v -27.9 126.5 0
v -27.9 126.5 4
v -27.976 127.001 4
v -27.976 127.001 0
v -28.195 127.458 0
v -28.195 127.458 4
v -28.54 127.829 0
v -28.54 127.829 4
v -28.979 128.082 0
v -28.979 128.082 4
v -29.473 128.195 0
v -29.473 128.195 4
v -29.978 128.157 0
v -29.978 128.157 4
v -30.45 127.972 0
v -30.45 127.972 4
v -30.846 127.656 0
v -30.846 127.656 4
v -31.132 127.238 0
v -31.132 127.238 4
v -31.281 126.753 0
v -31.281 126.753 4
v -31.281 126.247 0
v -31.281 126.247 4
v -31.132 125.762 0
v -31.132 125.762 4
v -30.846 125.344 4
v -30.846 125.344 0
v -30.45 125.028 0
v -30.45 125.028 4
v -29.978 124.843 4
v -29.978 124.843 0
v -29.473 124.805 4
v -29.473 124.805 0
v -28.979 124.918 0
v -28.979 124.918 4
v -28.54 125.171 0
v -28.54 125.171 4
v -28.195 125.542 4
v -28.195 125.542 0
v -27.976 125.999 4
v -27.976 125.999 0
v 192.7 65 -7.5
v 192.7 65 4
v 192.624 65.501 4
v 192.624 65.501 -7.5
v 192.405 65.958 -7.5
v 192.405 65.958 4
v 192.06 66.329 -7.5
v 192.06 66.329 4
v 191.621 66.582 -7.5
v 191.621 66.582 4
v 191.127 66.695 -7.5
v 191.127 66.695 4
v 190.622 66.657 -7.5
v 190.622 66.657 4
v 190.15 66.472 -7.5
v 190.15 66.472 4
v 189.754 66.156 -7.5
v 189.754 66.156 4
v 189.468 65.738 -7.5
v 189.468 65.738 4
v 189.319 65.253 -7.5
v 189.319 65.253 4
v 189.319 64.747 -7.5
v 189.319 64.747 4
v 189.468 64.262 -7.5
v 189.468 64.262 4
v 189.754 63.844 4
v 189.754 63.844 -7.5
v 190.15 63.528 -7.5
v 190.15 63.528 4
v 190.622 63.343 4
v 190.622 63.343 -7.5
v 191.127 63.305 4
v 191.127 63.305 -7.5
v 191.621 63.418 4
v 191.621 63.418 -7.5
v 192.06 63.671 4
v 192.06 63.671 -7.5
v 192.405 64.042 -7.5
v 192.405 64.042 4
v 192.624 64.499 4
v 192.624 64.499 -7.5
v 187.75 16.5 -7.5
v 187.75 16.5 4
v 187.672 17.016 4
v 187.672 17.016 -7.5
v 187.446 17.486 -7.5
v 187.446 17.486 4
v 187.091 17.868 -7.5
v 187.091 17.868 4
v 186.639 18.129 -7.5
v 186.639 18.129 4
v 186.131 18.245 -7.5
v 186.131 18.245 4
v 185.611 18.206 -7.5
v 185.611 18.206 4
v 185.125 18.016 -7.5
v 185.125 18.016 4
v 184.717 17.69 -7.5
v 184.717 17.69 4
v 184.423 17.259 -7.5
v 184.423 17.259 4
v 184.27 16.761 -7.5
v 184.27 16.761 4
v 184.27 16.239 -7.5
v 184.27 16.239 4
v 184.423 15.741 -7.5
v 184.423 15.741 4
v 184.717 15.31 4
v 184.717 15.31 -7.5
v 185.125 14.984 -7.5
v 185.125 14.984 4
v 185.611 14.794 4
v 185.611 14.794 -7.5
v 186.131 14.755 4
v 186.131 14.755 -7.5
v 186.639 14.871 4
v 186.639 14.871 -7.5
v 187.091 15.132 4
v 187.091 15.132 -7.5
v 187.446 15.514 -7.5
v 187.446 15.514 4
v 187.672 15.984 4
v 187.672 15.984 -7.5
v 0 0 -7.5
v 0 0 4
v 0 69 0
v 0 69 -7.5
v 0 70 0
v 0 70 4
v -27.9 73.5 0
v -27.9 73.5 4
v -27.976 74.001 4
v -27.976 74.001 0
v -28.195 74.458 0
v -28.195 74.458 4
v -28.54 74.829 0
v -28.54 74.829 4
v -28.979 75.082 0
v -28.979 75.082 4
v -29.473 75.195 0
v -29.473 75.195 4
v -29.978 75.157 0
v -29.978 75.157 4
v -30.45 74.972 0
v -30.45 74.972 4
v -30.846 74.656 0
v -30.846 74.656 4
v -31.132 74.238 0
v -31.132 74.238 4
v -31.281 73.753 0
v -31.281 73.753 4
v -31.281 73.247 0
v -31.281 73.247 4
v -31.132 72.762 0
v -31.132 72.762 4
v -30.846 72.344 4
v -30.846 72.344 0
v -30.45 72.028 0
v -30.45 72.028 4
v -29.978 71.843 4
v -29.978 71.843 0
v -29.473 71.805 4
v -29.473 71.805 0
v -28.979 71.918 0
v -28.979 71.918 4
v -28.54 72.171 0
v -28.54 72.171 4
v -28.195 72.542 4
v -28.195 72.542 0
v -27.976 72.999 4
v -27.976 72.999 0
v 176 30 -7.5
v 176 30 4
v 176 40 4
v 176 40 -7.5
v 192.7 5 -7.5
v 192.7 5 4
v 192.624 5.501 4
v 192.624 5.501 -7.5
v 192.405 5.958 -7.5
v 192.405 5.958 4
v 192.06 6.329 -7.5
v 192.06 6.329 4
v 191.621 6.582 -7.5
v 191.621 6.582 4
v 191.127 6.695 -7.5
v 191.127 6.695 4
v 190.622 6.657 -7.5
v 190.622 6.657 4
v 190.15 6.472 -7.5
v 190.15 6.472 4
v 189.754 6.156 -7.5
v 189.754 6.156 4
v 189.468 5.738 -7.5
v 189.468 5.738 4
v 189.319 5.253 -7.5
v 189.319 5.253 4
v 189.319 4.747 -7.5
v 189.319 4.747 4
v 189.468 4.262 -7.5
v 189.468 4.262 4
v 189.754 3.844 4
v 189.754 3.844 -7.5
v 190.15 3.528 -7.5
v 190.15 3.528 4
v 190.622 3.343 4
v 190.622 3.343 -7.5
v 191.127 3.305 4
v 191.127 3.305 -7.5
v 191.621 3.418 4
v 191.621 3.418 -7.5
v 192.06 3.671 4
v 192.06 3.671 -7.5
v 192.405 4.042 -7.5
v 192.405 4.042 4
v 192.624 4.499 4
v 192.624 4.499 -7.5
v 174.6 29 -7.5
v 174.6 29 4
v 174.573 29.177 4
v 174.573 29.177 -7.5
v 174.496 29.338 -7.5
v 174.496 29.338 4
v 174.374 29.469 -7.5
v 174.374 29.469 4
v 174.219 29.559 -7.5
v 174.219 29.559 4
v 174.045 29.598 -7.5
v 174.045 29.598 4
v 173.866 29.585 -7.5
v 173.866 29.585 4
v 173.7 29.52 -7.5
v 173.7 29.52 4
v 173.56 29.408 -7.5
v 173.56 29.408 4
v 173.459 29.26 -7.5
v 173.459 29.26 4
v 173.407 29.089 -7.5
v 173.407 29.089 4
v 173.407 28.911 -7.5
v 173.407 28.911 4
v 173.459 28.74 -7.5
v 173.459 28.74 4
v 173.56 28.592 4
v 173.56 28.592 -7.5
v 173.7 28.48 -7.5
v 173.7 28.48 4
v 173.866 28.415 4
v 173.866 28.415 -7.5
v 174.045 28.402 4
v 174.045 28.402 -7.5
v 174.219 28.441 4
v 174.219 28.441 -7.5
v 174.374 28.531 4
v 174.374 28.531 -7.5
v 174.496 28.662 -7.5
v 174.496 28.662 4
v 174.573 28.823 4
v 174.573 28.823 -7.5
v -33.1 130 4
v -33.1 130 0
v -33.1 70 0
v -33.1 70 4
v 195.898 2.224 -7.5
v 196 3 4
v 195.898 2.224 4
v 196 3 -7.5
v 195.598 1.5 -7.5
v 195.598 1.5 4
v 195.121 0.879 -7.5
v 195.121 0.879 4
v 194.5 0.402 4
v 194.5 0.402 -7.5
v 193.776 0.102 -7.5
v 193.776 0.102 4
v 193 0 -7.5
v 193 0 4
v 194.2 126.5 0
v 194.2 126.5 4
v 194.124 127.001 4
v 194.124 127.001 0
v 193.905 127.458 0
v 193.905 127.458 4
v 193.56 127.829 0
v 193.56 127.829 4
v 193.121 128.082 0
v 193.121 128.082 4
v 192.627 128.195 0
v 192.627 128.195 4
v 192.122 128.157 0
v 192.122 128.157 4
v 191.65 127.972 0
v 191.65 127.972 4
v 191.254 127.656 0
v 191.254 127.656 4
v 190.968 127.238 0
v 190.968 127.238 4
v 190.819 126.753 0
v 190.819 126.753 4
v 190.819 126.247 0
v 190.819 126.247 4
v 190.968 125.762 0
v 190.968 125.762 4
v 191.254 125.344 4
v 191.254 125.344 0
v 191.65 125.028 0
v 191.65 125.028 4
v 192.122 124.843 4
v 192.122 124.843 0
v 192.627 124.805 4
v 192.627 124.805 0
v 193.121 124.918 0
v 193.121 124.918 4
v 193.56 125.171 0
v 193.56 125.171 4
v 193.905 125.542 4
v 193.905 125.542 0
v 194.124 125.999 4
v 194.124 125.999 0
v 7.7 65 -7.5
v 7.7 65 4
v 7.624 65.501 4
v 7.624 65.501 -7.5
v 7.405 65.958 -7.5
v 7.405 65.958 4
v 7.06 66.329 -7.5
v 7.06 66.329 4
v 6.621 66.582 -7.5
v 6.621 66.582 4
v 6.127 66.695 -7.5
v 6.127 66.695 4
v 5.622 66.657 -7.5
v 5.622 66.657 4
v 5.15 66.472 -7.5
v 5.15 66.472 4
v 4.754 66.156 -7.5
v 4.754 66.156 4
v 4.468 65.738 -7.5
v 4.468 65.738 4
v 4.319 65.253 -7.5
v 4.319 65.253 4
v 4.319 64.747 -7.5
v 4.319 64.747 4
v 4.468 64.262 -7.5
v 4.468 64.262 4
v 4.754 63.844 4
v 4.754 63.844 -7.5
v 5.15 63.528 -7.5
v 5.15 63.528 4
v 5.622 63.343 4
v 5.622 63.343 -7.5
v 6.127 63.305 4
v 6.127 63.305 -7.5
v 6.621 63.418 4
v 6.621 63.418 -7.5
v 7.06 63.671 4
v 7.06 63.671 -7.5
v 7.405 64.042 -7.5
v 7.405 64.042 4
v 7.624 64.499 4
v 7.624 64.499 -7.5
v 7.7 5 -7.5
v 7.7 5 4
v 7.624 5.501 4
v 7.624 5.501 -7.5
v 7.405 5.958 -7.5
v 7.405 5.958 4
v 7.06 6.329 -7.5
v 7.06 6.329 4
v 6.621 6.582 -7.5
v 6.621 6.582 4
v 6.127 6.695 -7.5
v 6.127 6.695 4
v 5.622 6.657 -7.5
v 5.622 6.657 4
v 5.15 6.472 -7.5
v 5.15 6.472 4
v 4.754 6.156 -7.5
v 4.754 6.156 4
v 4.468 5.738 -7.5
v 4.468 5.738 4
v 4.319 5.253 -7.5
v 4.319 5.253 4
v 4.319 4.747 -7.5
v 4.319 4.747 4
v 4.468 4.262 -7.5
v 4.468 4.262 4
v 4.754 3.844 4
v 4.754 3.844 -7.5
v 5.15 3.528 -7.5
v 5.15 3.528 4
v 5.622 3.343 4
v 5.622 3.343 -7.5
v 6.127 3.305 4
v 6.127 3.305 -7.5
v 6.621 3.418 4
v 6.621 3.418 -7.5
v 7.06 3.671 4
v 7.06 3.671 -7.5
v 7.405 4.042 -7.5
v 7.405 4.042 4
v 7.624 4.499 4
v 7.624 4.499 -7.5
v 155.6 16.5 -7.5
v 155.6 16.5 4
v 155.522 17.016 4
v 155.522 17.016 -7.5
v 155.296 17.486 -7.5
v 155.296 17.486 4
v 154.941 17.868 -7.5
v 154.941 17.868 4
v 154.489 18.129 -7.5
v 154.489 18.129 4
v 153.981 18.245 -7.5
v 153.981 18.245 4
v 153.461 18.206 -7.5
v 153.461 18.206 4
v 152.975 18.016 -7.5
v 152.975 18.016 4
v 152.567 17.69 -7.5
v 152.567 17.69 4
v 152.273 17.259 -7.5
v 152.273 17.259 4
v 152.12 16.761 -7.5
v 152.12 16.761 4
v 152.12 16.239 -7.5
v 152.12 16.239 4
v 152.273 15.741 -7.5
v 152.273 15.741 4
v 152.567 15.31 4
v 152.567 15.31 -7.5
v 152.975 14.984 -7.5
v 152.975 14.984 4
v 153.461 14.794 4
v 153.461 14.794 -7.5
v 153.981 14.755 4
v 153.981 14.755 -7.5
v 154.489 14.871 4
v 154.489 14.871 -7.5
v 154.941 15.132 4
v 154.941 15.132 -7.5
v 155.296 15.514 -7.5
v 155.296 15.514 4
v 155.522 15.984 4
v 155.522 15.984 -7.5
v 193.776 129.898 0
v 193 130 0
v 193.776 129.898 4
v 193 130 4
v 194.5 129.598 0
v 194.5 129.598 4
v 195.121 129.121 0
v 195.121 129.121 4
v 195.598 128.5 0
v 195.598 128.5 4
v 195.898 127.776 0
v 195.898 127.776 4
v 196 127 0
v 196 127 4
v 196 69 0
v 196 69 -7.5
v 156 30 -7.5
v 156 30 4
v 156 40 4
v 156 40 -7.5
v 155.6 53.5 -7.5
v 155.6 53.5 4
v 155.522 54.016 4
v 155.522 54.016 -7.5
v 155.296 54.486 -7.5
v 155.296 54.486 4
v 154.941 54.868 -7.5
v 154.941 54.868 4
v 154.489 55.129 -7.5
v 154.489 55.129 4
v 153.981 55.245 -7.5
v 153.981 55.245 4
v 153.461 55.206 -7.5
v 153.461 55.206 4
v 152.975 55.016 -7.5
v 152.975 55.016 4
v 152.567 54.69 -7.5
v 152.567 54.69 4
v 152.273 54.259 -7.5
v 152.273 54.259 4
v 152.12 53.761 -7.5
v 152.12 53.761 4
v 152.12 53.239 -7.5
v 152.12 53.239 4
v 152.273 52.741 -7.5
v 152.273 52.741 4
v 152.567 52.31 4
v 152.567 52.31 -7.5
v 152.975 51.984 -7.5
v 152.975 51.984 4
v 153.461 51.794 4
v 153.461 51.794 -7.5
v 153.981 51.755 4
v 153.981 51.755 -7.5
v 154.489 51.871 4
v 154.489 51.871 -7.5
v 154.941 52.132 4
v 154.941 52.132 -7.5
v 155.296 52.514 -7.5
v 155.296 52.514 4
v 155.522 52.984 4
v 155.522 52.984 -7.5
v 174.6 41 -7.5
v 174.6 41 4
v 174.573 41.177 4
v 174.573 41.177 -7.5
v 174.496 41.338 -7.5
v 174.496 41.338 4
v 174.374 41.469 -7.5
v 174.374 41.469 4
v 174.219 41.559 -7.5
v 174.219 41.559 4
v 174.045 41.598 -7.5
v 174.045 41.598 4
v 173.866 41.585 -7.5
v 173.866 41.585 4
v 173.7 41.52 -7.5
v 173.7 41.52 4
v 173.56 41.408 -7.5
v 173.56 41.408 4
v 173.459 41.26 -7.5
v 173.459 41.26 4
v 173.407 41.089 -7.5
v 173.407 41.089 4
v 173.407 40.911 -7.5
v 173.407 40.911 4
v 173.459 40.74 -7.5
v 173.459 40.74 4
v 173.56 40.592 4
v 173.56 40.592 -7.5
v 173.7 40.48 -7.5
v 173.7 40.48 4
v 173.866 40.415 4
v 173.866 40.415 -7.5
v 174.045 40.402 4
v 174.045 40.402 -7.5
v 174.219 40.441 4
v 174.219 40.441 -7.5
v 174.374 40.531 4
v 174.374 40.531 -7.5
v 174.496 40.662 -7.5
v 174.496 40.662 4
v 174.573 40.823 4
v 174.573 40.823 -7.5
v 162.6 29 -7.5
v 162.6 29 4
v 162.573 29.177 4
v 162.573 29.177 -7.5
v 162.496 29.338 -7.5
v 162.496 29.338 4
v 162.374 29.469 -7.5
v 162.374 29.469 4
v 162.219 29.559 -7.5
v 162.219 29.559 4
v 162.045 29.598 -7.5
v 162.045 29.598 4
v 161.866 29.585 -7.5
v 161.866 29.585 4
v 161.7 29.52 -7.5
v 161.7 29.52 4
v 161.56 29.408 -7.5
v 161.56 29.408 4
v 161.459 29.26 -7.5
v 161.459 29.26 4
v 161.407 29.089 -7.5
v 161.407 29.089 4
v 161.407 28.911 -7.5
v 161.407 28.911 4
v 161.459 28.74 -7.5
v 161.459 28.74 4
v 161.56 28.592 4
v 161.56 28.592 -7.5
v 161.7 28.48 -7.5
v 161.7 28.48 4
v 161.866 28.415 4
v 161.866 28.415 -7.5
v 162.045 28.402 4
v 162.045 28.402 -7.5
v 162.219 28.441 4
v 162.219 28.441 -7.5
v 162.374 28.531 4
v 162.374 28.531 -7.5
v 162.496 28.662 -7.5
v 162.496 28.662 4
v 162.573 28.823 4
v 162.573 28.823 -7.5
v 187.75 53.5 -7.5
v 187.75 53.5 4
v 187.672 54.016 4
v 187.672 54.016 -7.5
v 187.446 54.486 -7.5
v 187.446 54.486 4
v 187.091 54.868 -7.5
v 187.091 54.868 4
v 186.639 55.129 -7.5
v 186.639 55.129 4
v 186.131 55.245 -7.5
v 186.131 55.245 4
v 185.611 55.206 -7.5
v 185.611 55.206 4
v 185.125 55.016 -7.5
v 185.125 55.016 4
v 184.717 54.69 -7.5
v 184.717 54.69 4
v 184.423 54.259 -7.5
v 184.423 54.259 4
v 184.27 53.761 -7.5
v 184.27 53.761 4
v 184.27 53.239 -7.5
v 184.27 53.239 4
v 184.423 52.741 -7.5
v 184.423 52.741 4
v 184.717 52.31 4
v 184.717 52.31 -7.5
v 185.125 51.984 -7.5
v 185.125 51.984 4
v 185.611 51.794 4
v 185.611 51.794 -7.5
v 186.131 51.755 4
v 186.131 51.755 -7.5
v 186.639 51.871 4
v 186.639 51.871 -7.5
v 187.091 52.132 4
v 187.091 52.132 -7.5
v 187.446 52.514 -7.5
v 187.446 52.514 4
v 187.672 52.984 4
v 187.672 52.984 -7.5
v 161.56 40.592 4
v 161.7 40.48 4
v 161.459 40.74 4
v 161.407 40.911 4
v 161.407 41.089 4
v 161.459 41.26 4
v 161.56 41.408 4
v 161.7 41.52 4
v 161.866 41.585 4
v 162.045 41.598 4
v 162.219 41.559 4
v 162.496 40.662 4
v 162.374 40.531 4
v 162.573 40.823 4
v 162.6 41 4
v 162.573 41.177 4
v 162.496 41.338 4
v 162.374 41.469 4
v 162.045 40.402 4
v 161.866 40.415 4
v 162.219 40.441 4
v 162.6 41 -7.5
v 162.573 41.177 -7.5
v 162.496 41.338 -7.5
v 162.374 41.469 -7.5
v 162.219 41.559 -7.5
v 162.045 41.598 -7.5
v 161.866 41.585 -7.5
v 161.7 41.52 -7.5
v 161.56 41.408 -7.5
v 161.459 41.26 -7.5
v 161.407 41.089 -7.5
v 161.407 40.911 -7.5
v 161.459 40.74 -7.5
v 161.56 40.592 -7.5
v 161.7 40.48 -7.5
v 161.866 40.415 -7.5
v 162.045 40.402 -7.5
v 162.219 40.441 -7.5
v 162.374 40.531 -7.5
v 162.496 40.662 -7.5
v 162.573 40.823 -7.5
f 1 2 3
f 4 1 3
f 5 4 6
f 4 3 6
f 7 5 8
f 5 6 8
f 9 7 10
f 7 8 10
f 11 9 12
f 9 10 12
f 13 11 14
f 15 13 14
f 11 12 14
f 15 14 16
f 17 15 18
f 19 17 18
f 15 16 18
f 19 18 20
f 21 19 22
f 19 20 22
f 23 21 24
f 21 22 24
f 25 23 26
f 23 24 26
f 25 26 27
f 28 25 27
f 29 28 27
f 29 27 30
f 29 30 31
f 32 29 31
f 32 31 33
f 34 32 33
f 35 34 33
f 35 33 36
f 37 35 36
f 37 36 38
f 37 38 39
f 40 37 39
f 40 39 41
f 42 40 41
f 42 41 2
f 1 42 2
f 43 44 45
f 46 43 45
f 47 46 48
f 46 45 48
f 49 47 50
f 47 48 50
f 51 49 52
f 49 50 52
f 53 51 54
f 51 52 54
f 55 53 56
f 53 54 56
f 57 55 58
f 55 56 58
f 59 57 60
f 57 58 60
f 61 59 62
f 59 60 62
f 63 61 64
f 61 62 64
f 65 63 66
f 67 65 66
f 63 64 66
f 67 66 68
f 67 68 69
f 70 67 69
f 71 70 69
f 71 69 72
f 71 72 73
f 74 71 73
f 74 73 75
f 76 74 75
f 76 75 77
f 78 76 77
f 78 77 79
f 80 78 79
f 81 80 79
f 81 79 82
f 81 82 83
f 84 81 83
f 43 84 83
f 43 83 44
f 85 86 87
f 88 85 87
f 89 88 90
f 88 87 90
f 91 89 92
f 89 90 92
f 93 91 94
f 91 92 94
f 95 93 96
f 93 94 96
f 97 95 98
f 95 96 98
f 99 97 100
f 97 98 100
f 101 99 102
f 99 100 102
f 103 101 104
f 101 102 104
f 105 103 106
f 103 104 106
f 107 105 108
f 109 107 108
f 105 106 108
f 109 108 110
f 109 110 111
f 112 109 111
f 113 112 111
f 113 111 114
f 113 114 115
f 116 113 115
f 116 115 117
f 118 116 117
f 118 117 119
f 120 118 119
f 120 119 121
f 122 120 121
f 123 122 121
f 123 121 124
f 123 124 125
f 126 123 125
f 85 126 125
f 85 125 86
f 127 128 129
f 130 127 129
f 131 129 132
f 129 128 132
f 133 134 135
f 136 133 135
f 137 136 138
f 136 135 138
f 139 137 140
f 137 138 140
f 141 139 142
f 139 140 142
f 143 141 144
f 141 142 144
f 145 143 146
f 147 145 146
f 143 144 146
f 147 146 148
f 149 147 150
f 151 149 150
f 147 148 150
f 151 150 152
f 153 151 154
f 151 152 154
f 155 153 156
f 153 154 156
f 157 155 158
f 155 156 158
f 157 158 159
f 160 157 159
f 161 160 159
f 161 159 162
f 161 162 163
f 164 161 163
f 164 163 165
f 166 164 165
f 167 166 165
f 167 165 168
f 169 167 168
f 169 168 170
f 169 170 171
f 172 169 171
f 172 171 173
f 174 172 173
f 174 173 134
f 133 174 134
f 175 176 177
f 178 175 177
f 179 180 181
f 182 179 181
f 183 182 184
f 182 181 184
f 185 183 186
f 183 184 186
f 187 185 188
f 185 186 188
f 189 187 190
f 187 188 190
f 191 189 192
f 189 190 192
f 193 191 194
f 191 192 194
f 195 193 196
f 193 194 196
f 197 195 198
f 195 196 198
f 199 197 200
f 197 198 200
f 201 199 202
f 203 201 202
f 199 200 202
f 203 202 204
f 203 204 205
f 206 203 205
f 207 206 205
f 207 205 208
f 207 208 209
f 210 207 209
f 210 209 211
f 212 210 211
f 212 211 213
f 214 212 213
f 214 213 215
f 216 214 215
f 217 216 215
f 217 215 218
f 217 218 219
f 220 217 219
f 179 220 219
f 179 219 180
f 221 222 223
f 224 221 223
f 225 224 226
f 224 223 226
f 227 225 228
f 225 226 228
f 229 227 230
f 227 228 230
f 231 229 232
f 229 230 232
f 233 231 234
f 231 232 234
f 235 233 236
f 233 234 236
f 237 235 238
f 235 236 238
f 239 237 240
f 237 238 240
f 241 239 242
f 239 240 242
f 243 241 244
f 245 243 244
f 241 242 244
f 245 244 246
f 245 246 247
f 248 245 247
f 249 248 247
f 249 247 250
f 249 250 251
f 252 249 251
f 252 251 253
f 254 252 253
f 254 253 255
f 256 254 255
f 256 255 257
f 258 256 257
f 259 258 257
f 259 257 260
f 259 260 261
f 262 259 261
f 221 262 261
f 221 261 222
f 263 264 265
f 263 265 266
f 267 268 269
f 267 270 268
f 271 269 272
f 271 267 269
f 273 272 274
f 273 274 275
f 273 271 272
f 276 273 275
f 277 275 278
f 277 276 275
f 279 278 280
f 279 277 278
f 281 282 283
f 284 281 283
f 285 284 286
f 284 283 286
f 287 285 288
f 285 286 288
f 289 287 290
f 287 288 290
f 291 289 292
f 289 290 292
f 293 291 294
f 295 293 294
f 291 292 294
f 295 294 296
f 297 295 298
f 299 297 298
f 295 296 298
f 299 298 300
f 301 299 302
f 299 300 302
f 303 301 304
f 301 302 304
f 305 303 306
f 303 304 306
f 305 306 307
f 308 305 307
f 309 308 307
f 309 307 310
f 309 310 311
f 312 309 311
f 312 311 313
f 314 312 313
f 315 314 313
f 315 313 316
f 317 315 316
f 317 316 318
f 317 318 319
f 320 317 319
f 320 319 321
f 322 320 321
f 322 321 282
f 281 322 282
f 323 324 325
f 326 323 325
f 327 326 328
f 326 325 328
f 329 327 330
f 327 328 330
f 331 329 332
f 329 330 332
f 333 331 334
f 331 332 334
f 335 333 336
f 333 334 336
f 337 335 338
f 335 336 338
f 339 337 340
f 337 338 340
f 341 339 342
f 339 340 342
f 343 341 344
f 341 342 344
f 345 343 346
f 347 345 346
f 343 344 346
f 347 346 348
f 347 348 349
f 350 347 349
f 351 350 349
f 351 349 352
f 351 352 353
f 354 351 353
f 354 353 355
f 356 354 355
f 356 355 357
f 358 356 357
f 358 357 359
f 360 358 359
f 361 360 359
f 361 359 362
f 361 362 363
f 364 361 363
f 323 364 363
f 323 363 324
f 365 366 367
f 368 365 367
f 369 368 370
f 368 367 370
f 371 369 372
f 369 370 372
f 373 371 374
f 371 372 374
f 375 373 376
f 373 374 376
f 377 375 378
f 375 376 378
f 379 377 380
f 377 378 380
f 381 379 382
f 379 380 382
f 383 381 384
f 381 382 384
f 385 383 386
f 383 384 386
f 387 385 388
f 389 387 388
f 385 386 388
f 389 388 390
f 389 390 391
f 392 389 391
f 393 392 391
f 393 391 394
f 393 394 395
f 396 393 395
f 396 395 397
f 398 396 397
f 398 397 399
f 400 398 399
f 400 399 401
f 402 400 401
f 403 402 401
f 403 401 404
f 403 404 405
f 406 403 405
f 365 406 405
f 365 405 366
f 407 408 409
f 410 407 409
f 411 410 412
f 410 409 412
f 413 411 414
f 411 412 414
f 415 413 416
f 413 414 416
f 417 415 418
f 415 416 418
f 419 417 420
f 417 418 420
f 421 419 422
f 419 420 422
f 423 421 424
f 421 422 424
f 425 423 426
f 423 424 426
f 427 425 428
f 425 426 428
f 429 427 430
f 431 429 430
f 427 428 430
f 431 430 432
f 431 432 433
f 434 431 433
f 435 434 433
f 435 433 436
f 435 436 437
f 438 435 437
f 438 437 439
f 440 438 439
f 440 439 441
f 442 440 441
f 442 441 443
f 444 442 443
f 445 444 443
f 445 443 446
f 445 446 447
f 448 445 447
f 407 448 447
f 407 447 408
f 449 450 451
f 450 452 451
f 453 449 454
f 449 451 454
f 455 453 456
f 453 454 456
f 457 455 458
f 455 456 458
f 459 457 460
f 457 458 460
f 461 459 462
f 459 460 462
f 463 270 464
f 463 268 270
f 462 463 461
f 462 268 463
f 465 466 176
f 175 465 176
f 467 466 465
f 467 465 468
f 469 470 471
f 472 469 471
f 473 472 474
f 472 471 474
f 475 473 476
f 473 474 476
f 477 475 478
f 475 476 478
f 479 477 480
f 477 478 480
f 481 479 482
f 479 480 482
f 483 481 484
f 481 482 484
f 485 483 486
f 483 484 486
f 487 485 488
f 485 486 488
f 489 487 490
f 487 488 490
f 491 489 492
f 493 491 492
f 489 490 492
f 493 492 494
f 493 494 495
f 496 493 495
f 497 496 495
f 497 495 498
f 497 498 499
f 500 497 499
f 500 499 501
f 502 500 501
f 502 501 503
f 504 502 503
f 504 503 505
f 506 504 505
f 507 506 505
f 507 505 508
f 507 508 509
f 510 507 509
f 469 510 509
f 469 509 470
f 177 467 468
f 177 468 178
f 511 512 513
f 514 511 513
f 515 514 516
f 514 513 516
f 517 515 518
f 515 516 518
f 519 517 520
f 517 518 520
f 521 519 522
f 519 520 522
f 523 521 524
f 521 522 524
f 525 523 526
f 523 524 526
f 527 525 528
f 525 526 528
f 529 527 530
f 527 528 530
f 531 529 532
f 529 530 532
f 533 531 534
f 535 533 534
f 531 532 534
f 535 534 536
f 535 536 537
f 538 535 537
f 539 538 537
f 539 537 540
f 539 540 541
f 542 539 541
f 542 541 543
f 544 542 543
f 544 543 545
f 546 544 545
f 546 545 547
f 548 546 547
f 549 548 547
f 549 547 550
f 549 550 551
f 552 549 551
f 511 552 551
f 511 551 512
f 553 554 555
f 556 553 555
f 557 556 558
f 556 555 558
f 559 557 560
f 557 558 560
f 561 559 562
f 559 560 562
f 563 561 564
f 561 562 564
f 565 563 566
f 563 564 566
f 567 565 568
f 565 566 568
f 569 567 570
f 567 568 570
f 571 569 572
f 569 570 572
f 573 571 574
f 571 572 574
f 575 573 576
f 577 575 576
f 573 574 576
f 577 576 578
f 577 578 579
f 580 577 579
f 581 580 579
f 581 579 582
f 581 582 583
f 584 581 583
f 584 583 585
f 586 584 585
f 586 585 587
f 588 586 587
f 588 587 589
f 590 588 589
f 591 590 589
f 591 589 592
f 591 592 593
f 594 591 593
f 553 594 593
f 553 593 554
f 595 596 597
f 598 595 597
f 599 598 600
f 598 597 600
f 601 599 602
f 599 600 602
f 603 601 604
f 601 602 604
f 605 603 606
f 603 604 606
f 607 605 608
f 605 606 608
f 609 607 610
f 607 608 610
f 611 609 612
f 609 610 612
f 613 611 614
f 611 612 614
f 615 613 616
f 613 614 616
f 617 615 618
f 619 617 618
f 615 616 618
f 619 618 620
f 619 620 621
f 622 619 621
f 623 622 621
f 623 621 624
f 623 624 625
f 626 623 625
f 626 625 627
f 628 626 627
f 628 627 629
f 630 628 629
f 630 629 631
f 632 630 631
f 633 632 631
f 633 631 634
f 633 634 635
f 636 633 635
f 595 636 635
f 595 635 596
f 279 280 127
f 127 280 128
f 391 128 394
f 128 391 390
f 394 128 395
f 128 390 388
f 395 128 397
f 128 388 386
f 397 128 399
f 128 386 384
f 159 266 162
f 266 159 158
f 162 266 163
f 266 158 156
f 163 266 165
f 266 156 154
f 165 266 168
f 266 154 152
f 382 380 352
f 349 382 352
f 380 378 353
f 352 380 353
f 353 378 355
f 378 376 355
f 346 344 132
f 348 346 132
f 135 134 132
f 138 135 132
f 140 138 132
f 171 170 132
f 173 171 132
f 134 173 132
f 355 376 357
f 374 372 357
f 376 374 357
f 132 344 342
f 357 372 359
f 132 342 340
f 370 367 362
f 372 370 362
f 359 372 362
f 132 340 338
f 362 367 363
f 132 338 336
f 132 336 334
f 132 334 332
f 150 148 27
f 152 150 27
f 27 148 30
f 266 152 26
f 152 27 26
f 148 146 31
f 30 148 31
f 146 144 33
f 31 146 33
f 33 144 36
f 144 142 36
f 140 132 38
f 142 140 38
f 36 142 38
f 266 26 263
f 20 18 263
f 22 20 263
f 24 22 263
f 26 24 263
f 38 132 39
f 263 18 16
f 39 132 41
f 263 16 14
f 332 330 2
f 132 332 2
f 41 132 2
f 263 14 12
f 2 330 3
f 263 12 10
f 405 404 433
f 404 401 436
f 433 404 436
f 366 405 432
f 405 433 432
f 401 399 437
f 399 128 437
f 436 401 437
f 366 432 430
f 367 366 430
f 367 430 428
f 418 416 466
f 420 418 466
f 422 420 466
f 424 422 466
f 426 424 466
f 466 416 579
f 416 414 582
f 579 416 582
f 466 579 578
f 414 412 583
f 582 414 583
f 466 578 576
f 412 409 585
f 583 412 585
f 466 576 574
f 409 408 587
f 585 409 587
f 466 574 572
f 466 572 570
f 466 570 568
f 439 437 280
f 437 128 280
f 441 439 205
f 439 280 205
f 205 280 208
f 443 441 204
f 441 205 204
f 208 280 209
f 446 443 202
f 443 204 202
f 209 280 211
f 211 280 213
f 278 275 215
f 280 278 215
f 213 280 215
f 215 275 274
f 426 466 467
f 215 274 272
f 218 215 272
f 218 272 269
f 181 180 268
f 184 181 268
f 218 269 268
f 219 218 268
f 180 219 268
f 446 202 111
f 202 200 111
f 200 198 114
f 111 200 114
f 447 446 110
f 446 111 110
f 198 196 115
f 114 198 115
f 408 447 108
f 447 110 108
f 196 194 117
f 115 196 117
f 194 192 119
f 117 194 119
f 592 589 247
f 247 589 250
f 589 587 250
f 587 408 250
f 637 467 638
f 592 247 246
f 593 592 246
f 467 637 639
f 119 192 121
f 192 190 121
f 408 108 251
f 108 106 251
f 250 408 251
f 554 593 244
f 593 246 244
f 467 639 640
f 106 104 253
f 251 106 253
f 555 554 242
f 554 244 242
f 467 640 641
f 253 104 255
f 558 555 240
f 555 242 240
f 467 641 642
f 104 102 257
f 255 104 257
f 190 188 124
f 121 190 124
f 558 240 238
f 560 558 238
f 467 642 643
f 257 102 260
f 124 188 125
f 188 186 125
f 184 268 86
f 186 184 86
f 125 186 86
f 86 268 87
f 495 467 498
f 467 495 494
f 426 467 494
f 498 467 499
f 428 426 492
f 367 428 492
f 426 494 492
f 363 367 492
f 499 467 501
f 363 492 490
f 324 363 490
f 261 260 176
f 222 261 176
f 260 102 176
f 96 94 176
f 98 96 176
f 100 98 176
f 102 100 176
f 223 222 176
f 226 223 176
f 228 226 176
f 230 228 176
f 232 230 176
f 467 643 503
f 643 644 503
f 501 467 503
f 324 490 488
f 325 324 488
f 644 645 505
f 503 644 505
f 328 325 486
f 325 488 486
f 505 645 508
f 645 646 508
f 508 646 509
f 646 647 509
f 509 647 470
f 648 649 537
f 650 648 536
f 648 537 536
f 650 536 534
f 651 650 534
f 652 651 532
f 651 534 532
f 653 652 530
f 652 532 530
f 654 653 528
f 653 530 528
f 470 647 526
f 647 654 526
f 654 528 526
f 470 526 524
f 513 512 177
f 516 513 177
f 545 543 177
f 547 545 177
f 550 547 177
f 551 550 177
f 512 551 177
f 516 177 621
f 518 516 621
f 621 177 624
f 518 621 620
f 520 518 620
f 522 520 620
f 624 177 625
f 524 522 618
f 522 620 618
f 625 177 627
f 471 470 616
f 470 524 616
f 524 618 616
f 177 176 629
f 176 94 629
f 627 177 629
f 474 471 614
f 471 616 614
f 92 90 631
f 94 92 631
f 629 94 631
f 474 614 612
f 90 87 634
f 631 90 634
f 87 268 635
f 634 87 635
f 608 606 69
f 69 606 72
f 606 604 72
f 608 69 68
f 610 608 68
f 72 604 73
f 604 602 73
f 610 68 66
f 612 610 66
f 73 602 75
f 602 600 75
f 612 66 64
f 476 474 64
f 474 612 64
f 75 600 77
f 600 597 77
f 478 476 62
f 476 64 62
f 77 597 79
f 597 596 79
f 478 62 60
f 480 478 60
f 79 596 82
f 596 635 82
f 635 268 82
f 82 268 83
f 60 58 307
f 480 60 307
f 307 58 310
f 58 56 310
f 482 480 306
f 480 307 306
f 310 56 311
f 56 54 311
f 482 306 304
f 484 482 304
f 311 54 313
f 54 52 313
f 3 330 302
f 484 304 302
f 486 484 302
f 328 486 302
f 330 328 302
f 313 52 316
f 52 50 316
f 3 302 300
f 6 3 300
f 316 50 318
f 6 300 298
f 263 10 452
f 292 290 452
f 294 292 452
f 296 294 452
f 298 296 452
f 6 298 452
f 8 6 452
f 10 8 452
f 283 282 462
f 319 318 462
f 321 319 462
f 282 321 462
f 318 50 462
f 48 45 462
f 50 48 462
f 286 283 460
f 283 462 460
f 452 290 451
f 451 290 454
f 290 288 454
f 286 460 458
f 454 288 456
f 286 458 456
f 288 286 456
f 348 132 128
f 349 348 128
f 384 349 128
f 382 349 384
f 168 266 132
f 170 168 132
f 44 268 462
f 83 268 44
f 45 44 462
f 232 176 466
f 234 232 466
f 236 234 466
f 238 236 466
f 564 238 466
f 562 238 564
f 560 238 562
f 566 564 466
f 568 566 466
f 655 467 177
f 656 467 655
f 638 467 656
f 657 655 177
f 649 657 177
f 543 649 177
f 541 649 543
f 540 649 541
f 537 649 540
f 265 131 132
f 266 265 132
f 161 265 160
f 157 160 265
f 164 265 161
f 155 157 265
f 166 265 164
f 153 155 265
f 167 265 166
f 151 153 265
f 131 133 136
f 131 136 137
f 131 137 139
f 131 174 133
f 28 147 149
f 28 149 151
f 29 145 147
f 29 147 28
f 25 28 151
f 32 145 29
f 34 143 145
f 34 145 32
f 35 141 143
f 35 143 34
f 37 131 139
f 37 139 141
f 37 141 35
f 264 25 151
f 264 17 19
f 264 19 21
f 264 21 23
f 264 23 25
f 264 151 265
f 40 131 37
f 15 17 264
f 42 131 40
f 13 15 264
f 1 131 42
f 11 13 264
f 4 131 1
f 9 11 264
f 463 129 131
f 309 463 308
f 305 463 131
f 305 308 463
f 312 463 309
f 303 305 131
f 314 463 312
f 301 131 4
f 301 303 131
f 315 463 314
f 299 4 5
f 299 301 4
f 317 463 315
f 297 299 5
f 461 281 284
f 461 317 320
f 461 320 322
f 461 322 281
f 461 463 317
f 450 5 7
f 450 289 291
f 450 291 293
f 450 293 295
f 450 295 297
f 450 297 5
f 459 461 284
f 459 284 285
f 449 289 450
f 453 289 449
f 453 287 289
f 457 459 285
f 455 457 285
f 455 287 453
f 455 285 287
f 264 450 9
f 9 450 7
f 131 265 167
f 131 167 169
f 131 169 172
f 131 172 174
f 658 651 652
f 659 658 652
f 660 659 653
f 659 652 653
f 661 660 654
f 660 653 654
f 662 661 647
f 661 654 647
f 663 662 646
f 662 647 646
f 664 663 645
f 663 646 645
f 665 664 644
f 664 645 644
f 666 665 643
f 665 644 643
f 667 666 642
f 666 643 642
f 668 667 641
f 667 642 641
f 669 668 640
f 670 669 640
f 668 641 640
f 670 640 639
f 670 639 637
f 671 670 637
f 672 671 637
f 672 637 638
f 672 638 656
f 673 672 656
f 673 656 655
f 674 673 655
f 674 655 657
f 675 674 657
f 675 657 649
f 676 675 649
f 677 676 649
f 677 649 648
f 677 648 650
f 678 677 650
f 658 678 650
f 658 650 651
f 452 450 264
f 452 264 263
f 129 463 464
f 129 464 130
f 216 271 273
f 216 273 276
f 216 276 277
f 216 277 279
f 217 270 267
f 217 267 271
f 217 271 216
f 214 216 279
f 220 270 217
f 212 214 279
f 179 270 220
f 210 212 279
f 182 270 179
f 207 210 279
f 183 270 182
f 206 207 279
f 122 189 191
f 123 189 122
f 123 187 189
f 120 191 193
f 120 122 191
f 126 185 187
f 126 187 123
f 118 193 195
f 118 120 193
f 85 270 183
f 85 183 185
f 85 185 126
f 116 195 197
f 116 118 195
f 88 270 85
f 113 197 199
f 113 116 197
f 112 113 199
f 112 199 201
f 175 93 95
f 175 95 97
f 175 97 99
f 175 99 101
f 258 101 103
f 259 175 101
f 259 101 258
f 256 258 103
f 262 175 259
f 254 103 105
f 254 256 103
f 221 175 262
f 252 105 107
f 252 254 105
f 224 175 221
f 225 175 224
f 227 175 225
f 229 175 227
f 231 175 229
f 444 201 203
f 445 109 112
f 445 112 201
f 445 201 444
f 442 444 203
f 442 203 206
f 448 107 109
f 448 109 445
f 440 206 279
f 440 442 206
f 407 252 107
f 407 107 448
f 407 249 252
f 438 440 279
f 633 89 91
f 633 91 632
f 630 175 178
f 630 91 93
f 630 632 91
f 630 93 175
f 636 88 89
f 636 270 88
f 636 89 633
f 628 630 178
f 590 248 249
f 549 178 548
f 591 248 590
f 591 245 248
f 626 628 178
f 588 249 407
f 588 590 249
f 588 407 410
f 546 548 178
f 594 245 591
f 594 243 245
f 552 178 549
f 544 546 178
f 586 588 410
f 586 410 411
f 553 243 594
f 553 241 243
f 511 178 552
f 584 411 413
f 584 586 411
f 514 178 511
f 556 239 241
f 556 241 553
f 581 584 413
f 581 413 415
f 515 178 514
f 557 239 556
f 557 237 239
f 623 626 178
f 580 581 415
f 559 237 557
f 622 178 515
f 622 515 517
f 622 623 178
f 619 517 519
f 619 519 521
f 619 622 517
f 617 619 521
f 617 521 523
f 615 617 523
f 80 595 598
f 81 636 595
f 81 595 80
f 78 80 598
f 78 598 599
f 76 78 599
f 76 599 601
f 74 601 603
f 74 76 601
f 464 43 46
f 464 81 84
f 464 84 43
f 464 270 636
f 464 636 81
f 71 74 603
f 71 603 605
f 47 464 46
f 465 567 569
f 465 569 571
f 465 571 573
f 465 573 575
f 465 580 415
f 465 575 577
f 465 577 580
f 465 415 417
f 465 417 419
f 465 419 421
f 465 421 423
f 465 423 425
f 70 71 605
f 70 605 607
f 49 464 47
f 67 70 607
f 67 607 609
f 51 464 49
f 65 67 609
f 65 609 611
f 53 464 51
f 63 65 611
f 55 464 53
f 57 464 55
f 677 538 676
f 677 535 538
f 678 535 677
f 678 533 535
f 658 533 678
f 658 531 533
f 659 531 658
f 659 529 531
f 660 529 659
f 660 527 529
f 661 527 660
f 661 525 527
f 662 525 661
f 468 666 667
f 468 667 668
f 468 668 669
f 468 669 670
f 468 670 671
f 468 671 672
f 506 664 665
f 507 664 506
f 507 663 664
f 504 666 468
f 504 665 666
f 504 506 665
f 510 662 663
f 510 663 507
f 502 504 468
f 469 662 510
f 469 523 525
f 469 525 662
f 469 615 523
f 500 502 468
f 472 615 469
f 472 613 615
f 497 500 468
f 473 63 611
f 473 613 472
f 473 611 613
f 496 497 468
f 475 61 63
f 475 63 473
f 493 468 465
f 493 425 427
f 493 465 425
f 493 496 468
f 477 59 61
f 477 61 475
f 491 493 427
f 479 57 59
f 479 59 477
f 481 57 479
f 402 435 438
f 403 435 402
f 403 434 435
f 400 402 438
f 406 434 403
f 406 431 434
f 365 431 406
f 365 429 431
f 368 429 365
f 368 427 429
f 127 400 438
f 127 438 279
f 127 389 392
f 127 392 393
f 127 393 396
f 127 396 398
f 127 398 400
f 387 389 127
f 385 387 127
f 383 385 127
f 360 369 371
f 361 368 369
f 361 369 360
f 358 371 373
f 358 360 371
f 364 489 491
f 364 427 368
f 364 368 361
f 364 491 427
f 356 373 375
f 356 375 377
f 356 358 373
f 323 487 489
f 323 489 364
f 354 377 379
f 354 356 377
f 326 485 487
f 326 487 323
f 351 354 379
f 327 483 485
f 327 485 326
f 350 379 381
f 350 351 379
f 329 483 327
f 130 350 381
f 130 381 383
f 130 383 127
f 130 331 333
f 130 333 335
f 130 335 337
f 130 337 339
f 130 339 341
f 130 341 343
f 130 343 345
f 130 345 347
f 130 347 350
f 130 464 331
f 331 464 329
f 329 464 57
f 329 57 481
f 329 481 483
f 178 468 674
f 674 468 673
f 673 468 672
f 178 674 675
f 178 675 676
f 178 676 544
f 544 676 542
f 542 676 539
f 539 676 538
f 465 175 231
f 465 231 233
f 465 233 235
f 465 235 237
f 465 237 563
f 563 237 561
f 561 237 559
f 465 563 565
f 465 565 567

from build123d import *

# Parameters (mm, degrees)
SKETCH_1_W          = 196
SKETCH_1_H          = 130
EXTRUDE_1_DEPTH     = 4
SKETCH_3_W          = 196
SKETCH_3_H          = 69
EXTRUDE_2_DEPTH     = 7.5
SKETCH_4_W          = 4
SKETCH_4_H          = 60
EXTRUDE_3_DEPTH     = 33.1
SKETCH_2_R          = 1.7
CUT_EXTRUDE_1_DEPTH = 236.474520915
SKETCH_5_R          = 1.7
CUT_EXTRUDE_2_DEPTH = 236.474520915
FILLET_1_R          = 3
SKETCH_7_R          = 0.6
SKETCH_7_W          = 20
SKETCH_7_H          = 10
CUT_EXTRUDE_3_DEPTH = 236.474520915
SKETCH_8_R          = 1.75
CUT_EXTRUDE_4_DEPTH = 40


with BuildPart() as part:
    # ｽｹｯﾁ1 → ﾎﾞｽ - 押し出し1 (new body)
    with BuildSketch(Plane.XY):
        with Locations((98, 65)):
            Rectangle(SKETCH_1_W, SKETCH_1_H)
    extrude(amount=EXTRUDE_1_DEPTH)

    # ｽｹｯﾁ3 → ﾎﾞｽ - 押し出し2 (add)
    with BuildSketch(Plane(origin=(0, 0, 0), x_dir=(-1, 0, 0), z_dir=(0, 0, -1))):
        with Locations((-98, 34.5)):
            Rectangle(SKETCH_3_W, SKETCH_3_H)
    extrude(amount=EXTRUDE_2_DEPTH)

    # ｽｹｯﾁ4 → ﾎﾞｽ - 押し出し3 (add)
    with BuildSketch(Plane.ZY):
        with Locations((2, 100)):
            Rectangle(SKETCH_4_W, SKETCH_4_H)
    extrude(amount=EXTRUDE_3_DEPTH)

    # ｽｹｯﾁ2 → ｶｯﾄ - 押し出し1 (cut, through all)
    with BuildSketch(Plane.XY.offset(4)):
        with Locations((191, 5)):
            Circle(SKETCH_2_R)
        with Locations((192.5, 126.5)):
            Circle(SKETCH_2_R)
        with Locations((191, 65)):
            Circle(SKETCH_2_R)
        with Locations((6, 5)):
            Circle(SKETCH_2_R)
        with Locations((6, 65)):
            Circle(SKETCH_2_R)
    extrude(amount=-CUT_EXTRUDE_1_DEPTH, mode=Mode.SUBTRACT)

    # ｽｹｯﾁ5 → ｶｯﾄ - 押し出し2 (cut, through all)
    with BuildSketch(Plane.XY.offset(4)):
        with Locations((-29.6, 126.5)):
            Circle(SKETCH_5_R)
        with Locations((-29.6, 73.5)):
            Circle(SKETCH_5_R)
    extrude(amount=-CUT_EXTRUDE_2_DEPTH, mode=Mode.SUBTRACT)

    # ﾌｨﾚｯﾄ1
    fillet_1_edges = [part.edges().sort_by_distance(p)[0] for p in [
        (196, 130, 2),
        (196, 0, -1.75),
    ]]
    fillet(fillet_1_edges, radius=FILLET_1_R)

    # ｽｹｯﾁ7 → ｶｯﾄ - 押し出し3 (cut, through all)
    with BuildSketch(Plane.XY.offset(4)):
        with Locations((174, 41)):
            Circle(SKETCH_7_R)
        with Locations((162, 41)):
            Circle(SKETCH_7_R)
        with Locations((174, 29)):
            Circle(SKETCH_7_R)
        with Locations((162, 29)):
            Circle(SKETCH_7_R)
        with Locations((166, 35)):
            Rectangle(SKETCH_7_W, SKETCH_7_H)
    extrude(amount=-CUT_EXTRUDE_3_DEPTH, mode=Mode.SUBTRACT)

    # ｽｹｯﾁ8 → ｶｯﾄ - 押し出し4 (cut)
    with BuildSketch(Plane.XY.offset(4)):
        with Locations((186, 53.5)):
            Circle(SKETCH_8_R)
        with Locations((153.85, 53.5)):
            Circle(SKETCH_8_R)
        with Locations((153.85, 16.5)):
            Circle(SKETCH_8_R)
        with Locations((186, 16.5)):
            Circle(SKETCH_8_R)
    extrude(amount=-CUT_EXTRUDE_4_DEPTH, mode=Mode.SUBTRACT)


solid = part.part
